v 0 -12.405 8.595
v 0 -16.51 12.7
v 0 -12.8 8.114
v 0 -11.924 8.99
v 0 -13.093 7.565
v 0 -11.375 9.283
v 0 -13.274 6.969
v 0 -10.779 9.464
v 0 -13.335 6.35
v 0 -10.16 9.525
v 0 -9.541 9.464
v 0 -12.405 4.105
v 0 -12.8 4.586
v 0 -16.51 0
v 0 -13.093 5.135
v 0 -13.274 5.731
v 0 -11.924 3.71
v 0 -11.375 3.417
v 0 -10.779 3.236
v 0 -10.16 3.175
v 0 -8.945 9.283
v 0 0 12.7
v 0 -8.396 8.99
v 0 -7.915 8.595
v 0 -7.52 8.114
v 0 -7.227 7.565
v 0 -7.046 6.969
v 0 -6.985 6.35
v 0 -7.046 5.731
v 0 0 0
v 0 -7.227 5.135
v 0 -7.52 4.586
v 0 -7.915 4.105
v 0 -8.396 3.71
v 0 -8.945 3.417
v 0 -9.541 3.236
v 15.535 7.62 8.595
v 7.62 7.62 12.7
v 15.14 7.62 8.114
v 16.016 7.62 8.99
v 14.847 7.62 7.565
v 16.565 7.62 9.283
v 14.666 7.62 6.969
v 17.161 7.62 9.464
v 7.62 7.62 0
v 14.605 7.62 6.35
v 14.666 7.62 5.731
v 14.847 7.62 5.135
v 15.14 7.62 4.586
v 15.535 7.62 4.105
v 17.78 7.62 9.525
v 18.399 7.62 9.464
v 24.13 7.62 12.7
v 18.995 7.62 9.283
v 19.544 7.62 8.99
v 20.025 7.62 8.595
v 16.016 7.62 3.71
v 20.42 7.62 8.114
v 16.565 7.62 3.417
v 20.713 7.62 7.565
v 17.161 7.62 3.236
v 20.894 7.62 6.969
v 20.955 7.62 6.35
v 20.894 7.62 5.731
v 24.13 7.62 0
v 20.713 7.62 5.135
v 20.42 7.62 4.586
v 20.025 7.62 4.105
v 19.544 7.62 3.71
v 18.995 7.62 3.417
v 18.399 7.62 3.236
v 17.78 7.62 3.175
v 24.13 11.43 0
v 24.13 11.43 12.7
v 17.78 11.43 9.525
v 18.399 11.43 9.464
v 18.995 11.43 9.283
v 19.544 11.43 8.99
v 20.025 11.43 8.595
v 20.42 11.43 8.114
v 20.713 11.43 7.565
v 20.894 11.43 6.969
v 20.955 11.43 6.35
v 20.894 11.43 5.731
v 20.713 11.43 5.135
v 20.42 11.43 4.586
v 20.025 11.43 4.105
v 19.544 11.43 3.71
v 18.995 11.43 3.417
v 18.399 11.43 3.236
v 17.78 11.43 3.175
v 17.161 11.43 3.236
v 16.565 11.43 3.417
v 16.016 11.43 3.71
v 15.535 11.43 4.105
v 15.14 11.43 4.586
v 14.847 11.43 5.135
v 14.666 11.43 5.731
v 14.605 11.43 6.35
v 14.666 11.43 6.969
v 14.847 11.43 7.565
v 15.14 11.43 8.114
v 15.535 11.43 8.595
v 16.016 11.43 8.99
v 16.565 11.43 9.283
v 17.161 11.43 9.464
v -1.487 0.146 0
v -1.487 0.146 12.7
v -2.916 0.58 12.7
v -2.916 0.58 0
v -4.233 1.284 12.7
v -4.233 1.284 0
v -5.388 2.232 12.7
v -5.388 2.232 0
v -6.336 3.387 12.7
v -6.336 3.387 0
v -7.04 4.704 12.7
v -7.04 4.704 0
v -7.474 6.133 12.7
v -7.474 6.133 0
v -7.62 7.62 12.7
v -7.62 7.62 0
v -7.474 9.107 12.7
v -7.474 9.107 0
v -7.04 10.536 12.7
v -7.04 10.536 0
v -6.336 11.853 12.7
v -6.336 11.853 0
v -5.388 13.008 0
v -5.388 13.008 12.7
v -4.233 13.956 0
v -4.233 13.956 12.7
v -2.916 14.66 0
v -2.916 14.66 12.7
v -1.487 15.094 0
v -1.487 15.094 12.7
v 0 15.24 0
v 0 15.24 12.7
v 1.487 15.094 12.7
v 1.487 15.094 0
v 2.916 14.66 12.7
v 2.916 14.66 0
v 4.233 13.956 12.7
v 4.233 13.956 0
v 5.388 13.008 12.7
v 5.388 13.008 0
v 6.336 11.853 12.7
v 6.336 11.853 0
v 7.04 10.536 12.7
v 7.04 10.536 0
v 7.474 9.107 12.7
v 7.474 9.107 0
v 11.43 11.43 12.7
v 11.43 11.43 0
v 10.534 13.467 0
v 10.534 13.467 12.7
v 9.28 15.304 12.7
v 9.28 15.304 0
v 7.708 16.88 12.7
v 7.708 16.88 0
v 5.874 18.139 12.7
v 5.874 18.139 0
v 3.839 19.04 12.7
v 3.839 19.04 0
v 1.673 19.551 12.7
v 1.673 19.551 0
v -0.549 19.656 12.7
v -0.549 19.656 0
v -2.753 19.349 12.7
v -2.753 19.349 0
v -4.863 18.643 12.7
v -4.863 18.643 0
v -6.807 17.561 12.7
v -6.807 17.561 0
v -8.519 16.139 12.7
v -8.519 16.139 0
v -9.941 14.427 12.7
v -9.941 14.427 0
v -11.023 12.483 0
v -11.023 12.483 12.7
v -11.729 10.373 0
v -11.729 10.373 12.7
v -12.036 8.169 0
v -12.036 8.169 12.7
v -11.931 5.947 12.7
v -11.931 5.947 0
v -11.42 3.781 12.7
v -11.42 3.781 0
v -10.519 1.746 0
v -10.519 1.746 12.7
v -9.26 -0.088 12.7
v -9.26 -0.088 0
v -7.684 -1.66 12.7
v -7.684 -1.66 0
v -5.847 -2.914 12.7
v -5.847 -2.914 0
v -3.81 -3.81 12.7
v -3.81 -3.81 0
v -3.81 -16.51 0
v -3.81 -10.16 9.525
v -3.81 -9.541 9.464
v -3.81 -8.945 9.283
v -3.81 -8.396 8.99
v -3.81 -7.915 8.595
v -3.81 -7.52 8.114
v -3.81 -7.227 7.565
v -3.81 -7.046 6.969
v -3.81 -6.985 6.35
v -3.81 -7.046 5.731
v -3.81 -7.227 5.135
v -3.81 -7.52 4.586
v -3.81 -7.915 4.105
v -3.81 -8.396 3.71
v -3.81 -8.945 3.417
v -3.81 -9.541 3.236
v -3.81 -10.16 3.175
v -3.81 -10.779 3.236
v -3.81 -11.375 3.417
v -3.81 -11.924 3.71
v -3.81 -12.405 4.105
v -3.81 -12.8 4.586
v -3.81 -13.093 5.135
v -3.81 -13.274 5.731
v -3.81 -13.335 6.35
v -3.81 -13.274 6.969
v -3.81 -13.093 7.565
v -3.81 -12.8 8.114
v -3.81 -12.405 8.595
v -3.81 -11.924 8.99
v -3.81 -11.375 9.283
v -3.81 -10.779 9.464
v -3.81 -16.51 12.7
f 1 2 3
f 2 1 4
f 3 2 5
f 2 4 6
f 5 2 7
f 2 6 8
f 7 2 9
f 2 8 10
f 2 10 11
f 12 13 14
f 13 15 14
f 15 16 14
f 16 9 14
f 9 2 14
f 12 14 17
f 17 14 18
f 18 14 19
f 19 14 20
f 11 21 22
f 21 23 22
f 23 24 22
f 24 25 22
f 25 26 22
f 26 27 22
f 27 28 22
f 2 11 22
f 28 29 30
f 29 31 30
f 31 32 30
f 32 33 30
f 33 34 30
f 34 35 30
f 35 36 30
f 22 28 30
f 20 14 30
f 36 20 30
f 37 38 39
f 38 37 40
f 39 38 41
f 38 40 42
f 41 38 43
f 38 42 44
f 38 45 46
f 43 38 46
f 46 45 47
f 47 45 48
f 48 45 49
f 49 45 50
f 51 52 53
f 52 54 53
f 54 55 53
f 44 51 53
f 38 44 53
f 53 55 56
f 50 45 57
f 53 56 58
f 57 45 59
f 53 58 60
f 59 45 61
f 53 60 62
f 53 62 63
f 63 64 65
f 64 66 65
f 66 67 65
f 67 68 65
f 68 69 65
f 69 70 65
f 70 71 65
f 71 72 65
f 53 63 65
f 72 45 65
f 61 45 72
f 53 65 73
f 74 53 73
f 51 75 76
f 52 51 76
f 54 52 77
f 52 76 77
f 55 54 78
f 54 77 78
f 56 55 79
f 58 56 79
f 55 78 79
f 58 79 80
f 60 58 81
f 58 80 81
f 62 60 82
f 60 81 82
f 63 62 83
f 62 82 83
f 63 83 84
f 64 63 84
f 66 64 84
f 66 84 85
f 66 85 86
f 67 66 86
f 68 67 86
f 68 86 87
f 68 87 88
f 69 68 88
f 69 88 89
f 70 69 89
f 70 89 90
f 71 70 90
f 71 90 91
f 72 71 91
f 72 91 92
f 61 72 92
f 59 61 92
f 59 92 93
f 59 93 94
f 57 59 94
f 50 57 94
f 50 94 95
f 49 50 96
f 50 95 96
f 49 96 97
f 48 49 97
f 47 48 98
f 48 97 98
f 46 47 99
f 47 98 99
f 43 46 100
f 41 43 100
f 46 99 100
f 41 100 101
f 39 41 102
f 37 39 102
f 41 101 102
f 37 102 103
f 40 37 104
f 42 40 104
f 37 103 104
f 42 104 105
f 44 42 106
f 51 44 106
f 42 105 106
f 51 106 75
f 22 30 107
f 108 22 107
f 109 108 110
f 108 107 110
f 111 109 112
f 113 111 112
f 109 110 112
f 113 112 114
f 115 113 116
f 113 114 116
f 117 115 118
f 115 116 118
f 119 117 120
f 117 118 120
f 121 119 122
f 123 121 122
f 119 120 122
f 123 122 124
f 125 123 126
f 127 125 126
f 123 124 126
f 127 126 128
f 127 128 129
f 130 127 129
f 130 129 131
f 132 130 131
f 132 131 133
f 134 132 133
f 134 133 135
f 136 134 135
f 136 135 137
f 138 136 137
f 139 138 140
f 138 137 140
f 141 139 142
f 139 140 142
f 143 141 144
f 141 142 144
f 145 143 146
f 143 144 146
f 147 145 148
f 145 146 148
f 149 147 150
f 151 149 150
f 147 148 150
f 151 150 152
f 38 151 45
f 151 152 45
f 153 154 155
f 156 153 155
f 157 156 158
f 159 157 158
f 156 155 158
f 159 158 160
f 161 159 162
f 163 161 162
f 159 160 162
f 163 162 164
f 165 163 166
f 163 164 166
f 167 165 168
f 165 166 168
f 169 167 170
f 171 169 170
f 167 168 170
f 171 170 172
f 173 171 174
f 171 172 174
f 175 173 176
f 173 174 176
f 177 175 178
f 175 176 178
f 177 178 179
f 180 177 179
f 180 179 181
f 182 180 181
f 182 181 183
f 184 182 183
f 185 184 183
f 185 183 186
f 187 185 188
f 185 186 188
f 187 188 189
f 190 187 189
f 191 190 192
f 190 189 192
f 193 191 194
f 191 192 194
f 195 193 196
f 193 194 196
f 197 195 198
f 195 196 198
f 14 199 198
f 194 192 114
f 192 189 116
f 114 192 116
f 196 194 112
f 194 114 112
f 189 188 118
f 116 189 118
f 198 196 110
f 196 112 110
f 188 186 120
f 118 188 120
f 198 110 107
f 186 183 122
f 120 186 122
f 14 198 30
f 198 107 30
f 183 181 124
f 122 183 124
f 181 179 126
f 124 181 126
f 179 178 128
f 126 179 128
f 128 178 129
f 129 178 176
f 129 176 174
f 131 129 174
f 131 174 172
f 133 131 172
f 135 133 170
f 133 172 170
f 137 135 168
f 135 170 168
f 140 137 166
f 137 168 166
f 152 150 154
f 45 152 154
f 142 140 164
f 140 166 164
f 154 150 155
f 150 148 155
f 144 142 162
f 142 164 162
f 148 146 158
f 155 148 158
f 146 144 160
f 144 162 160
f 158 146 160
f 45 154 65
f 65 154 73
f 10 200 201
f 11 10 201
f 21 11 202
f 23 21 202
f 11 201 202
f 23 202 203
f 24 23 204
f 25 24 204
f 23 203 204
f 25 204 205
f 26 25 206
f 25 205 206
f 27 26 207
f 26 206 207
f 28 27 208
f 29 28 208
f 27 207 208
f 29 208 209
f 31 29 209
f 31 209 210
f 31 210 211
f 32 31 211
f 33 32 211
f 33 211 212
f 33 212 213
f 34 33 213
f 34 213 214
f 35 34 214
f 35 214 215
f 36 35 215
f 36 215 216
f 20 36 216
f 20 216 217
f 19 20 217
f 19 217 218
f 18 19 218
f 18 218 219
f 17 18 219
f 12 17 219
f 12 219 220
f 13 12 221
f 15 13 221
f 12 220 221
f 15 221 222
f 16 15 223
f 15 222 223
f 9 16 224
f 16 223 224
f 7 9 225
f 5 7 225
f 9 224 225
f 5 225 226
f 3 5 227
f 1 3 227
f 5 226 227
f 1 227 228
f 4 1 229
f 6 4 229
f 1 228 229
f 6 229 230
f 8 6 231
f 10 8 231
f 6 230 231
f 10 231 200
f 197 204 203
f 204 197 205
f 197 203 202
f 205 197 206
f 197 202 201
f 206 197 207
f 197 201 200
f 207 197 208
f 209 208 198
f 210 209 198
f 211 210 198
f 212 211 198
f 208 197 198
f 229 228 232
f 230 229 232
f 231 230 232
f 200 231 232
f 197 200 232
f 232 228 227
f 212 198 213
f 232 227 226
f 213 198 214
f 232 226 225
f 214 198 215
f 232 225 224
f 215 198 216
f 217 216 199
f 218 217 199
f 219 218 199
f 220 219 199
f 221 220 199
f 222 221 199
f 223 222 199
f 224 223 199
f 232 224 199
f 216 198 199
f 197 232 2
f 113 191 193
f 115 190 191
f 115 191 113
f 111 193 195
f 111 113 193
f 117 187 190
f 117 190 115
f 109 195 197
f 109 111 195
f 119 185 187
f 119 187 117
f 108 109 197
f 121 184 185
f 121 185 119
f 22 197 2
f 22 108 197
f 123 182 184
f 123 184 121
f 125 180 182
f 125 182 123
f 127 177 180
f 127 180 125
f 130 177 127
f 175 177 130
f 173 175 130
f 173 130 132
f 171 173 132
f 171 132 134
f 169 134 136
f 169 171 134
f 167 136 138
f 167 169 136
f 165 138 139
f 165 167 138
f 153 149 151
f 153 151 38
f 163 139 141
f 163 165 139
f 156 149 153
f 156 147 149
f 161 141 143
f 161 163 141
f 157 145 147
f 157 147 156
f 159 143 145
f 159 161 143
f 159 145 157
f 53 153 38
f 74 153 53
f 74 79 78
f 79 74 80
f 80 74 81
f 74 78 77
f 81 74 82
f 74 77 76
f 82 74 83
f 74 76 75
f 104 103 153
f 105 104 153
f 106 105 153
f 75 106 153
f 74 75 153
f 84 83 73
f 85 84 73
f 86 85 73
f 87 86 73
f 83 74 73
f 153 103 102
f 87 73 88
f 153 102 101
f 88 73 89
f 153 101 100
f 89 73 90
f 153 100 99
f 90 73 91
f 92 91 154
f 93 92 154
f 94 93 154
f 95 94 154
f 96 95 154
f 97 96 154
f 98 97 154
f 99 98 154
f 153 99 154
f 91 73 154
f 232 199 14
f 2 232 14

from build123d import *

# Parameters (mm, degrees)
BOSS_EXTRUDE1_DEPTH = 12.7
SKETCH2_R           = 3.175
CUT_EXTRUDE1_DEPTH  = 40.040882418
SKETCH3_R           = 3.175
CUT_EXTRUDE2_DEPTH  = 37.452362817


with BuildPart() as part:
    # Sketch1 → Boss-Extrude1 (new body)
    with BuildSketch(Plane.XY):
        with BuildLine():
            Line((-3.81, -3.81), (-3.81, -16.51))
            Line((-3.81, -16.51), (0, -16.51))
            Line((0, -16.51), (0, 0))
            ThreePointArc((0, 0), (-5.388153673, 13.008153673), (7.62, 7.62))
            Line((7.62, 7.62), (24.13, 7.62))
            Line((24.13, 7.62), (24.13, 11.43))
            Line((24.13, 11.43), (11.43, 11.43))
            ThreePointArc((11.43, 11.43), (-8.519418994, 16.139418994), (-3.81, -3.81))
        make_face()
    extrude(amount=BOSS_EXTRUDE1_DEPTH)

    # Sketch2 → Cut-Extrude1 (cut, through all)
    with BuildSketch(Plane(origin=(0, 11.43, 0), x_dir=(1, 0, 0), z_dir=(0, 1, 0))):
        with Locations(Location((17.78, -6.35, 0), (0, 0, 270))):
            Circle(SKETCH2_R)
    extrude(amount=-CUT_EXTRUDE1_DEPTH, mode=Mode.SUBTRACT)

    # Sketch3 → Cut-Extrude2 (cut, through all)
    with BuildSketch(Plane.ZY.offset(3.81)):
        with Locations((6.35, -10.16)):
            Circle(SKETCH3_R)
    extrude(amount=-CUT_EXTRUDE2_DEPTH, mode=Mode.SUBTRACT)


solid = part.part
